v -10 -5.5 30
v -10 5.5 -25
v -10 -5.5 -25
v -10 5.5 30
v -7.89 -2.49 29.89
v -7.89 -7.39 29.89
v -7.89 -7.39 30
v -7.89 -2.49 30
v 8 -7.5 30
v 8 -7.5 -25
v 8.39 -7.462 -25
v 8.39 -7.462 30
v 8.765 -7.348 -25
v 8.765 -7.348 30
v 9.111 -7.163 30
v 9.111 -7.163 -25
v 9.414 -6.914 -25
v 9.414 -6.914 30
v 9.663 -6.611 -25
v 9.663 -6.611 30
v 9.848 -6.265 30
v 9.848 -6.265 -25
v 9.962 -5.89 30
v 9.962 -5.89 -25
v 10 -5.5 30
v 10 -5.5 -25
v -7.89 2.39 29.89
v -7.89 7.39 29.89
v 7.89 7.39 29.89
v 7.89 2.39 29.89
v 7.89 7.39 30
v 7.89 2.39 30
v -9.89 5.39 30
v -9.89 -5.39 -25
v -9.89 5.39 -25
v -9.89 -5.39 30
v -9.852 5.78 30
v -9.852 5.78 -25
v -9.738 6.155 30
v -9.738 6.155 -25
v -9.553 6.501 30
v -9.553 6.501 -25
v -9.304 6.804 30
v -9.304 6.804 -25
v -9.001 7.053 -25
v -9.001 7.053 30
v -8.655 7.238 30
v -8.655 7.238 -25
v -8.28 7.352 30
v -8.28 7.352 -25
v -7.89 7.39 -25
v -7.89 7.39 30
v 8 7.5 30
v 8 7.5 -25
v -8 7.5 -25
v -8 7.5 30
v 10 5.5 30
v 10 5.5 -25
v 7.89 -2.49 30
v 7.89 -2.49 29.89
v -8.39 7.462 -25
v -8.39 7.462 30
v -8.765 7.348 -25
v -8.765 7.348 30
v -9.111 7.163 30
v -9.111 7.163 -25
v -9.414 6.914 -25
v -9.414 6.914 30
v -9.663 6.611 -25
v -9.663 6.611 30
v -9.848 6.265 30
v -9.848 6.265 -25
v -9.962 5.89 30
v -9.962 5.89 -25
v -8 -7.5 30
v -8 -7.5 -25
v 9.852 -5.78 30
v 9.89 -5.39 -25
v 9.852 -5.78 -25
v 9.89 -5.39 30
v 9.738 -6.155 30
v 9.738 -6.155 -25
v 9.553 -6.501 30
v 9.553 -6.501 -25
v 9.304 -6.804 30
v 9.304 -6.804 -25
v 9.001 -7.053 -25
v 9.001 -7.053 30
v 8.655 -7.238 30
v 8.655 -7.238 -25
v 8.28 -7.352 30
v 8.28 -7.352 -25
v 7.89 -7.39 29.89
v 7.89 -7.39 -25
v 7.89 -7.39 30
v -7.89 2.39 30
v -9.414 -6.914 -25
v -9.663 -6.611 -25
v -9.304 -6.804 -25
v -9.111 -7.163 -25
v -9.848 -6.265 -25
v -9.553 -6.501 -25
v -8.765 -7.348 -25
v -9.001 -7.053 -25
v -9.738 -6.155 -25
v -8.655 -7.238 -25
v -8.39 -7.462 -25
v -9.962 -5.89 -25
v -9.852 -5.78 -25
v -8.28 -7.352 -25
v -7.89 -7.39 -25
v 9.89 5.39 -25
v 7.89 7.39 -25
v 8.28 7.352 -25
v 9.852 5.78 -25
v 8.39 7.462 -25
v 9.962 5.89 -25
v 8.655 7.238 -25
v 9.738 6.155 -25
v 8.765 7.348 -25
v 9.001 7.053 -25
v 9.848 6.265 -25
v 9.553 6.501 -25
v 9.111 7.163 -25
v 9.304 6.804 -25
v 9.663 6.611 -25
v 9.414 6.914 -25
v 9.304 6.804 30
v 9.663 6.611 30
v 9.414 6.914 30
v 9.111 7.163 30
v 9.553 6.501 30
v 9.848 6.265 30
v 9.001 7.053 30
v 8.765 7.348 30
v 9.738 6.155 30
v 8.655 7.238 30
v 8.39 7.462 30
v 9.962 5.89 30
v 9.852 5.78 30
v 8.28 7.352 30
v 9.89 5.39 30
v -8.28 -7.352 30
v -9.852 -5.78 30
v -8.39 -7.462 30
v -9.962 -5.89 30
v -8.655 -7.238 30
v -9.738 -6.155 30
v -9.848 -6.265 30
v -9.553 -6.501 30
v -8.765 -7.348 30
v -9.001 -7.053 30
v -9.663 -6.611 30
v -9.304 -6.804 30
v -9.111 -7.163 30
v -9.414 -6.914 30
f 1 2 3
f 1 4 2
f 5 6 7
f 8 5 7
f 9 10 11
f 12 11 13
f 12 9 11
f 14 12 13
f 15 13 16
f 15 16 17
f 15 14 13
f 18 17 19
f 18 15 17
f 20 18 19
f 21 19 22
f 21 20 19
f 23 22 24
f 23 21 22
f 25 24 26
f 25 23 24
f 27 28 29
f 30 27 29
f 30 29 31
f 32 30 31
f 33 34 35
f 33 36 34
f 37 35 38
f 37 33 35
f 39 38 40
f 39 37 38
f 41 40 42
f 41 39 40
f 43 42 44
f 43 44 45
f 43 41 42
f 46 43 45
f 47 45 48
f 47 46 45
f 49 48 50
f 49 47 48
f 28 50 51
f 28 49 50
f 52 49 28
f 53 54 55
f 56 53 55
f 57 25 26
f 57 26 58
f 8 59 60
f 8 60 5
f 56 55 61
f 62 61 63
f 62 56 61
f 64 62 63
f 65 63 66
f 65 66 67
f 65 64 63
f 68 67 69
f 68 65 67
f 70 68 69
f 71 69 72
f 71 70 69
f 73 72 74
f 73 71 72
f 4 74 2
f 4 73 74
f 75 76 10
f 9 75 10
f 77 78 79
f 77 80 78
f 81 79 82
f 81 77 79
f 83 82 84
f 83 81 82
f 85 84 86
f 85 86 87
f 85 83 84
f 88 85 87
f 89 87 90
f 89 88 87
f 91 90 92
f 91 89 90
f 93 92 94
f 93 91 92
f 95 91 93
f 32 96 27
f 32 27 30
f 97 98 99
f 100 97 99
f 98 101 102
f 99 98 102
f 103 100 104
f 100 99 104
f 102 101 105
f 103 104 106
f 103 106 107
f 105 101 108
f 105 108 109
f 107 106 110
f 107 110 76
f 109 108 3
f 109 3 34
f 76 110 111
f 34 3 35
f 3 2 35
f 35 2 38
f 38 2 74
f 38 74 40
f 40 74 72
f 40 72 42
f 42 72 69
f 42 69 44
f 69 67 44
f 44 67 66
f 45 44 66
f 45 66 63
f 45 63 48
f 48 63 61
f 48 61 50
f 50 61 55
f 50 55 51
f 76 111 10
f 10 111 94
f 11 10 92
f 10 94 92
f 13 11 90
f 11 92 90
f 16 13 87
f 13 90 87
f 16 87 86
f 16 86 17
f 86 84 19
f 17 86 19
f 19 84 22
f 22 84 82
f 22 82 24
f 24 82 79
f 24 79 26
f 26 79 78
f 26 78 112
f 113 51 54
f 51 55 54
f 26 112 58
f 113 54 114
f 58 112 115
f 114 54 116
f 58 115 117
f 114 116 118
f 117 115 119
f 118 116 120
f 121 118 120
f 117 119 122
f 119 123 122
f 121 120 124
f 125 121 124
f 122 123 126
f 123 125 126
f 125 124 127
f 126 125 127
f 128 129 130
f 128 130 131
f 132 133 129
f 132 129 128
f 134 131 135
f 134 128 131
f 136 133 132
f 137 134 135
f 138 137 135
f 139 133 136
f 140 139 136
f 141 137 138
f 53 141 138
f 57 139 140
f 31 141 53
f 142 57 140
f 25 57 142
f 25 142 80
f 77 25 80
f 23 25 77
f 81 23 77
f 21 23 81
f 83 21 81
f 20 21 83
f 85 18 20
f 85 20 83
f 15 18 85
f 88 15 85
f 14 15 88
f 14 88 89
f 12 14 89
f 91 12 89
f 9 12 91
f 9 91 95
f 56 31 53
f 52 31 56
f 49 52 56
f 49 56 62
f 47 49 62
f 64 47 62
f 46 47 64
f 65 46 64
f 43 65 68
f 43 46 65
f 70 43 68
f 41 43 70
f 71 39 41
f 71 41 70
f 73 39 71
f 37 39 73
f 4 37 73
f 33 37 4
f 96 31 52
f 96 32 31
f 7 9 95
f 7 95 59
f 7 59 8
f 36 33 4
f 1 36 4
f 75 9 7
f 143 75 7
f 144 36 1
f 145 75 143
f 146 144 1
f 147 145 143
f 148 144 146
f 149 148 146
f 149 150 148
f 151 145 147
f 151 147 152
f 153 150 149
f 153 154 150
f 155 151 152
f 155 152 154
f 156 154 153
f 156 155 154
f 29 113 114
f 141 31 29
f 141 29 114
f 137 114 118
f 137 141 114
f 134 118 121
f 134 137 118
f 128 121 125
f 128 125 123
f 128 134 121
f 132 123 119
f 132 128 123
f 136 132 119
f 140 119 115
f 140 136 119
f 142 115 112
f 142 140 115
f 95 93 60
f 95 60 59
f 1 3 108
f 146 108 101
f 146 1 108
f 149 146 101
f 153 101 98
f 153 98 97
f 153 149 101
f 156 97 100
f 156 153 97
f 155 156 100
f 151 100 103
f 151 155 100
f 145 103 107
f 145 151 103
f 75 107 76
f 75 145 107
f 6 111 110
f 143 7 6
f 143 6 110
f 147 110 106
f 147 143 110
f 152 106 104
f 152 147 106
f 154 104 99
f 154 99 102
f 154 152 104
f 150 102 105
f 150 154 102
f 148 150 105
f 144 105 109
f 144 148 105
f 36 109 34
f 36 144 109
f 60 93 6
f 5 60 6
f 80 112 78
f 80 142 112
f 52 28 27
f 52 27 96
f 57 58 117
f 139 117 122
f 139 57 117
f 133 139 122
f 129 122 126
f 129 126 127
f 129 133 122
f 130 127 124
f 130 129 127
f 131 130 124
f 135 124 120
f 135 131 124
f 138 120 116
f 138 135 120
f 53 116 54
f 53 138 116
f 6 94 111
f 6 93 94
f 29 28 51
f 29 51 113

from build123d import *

# Parameters (mm, degrees)
F1_DEPTH = 30
F2_W     = 15.78
F2_H     = 0.11
F3_DEPTH = 5
F4_W     = 15.78
F4_H     = 0.11
F5_DEPTH = 4.9
F6_DEPTH = 25


with BuildPart() as f1:
    # F0 (on Top) → F1 (new body)
    with BuildSketch(Plane.XY):
        with BuildLine():
            Line((-8, -7.5), (8, -7.5))
            ThreePointArc((8, -7.5), (9.4142135624, -6.9142135624), (10, -5.5))
            Line((10, -5.5), (10, 5.5))
            ThreePointArc((10, 5.5), (9.4142135624, 6.9142135624), (8, 7.5))
            Line((8, 7.5), (-8, 7.5))
            ThreePointArc((-8, 7.5), (-9.4142135624, 6.9142135624), (-10, 5.5))
            Line((-10, 5.5), (-10, -5.5))
            ThreePointArc((-10, -5.5), (-9.4142135624, -6.9142135624), (-8, -7.5))
        make_face()
        with BuildLine():
            Line((-7.89, 7.39), (7.89, 7.39))
            ThreePointArc((7.89, 7.39), (9.3042135624, 6.8042135624), (9.89, 5.39))
            Line((9.89, 5.39), (9.89, -5.39))
            ThreePointArc((9.89, -5.39), (9.3042135624, -6.8042135624), (7.89, -7.39))
            Line((7.89, -7.39), (-7.89, -7.39))
            ThreePointArc((-7.89, -7.39), (-9.3042135624, -6.8042135624), (-9.89, -5.39))
            Line((-9.89, -5.39), (-9.89, 5.39))
            ThreePointArc((-9.89, 5.39), (-9.3042135624, 6.8042135624), (-7.89, 7.39))
        make_face(mode=Mode.SUBTRACT)
    extrude(amount=F1_DEPTH)

    # F2 (on face) → F3 (join)
    with BuildSketch(Plane.XZ.offset(-7.39)):
        with Locations((0, 29.945)):
            Rectangle(F2_W, F2_H)
    extrude(amount=F3_DEPTH)

    # F4 (on face) → F5 (join)
    with BuildSketch(Plane(origin=(0, -7.39, 0), x_dir=(-1, 0, 0), z_dir=(0, 1, 0))):
        with Locations((0, 29.945)):
            Rectangle(F4_W, F4_H)
    extrude(amount=F5_DEPTH)

    # F6 (add): a face of the model
    f6_faces = [f1.faces().sort_by_distance(p)[0] for p in [
        (0, -7.475, 0),
    ]]
    extrude(f6_faces, amount=F6_DEPTH)


solid = f1.part
